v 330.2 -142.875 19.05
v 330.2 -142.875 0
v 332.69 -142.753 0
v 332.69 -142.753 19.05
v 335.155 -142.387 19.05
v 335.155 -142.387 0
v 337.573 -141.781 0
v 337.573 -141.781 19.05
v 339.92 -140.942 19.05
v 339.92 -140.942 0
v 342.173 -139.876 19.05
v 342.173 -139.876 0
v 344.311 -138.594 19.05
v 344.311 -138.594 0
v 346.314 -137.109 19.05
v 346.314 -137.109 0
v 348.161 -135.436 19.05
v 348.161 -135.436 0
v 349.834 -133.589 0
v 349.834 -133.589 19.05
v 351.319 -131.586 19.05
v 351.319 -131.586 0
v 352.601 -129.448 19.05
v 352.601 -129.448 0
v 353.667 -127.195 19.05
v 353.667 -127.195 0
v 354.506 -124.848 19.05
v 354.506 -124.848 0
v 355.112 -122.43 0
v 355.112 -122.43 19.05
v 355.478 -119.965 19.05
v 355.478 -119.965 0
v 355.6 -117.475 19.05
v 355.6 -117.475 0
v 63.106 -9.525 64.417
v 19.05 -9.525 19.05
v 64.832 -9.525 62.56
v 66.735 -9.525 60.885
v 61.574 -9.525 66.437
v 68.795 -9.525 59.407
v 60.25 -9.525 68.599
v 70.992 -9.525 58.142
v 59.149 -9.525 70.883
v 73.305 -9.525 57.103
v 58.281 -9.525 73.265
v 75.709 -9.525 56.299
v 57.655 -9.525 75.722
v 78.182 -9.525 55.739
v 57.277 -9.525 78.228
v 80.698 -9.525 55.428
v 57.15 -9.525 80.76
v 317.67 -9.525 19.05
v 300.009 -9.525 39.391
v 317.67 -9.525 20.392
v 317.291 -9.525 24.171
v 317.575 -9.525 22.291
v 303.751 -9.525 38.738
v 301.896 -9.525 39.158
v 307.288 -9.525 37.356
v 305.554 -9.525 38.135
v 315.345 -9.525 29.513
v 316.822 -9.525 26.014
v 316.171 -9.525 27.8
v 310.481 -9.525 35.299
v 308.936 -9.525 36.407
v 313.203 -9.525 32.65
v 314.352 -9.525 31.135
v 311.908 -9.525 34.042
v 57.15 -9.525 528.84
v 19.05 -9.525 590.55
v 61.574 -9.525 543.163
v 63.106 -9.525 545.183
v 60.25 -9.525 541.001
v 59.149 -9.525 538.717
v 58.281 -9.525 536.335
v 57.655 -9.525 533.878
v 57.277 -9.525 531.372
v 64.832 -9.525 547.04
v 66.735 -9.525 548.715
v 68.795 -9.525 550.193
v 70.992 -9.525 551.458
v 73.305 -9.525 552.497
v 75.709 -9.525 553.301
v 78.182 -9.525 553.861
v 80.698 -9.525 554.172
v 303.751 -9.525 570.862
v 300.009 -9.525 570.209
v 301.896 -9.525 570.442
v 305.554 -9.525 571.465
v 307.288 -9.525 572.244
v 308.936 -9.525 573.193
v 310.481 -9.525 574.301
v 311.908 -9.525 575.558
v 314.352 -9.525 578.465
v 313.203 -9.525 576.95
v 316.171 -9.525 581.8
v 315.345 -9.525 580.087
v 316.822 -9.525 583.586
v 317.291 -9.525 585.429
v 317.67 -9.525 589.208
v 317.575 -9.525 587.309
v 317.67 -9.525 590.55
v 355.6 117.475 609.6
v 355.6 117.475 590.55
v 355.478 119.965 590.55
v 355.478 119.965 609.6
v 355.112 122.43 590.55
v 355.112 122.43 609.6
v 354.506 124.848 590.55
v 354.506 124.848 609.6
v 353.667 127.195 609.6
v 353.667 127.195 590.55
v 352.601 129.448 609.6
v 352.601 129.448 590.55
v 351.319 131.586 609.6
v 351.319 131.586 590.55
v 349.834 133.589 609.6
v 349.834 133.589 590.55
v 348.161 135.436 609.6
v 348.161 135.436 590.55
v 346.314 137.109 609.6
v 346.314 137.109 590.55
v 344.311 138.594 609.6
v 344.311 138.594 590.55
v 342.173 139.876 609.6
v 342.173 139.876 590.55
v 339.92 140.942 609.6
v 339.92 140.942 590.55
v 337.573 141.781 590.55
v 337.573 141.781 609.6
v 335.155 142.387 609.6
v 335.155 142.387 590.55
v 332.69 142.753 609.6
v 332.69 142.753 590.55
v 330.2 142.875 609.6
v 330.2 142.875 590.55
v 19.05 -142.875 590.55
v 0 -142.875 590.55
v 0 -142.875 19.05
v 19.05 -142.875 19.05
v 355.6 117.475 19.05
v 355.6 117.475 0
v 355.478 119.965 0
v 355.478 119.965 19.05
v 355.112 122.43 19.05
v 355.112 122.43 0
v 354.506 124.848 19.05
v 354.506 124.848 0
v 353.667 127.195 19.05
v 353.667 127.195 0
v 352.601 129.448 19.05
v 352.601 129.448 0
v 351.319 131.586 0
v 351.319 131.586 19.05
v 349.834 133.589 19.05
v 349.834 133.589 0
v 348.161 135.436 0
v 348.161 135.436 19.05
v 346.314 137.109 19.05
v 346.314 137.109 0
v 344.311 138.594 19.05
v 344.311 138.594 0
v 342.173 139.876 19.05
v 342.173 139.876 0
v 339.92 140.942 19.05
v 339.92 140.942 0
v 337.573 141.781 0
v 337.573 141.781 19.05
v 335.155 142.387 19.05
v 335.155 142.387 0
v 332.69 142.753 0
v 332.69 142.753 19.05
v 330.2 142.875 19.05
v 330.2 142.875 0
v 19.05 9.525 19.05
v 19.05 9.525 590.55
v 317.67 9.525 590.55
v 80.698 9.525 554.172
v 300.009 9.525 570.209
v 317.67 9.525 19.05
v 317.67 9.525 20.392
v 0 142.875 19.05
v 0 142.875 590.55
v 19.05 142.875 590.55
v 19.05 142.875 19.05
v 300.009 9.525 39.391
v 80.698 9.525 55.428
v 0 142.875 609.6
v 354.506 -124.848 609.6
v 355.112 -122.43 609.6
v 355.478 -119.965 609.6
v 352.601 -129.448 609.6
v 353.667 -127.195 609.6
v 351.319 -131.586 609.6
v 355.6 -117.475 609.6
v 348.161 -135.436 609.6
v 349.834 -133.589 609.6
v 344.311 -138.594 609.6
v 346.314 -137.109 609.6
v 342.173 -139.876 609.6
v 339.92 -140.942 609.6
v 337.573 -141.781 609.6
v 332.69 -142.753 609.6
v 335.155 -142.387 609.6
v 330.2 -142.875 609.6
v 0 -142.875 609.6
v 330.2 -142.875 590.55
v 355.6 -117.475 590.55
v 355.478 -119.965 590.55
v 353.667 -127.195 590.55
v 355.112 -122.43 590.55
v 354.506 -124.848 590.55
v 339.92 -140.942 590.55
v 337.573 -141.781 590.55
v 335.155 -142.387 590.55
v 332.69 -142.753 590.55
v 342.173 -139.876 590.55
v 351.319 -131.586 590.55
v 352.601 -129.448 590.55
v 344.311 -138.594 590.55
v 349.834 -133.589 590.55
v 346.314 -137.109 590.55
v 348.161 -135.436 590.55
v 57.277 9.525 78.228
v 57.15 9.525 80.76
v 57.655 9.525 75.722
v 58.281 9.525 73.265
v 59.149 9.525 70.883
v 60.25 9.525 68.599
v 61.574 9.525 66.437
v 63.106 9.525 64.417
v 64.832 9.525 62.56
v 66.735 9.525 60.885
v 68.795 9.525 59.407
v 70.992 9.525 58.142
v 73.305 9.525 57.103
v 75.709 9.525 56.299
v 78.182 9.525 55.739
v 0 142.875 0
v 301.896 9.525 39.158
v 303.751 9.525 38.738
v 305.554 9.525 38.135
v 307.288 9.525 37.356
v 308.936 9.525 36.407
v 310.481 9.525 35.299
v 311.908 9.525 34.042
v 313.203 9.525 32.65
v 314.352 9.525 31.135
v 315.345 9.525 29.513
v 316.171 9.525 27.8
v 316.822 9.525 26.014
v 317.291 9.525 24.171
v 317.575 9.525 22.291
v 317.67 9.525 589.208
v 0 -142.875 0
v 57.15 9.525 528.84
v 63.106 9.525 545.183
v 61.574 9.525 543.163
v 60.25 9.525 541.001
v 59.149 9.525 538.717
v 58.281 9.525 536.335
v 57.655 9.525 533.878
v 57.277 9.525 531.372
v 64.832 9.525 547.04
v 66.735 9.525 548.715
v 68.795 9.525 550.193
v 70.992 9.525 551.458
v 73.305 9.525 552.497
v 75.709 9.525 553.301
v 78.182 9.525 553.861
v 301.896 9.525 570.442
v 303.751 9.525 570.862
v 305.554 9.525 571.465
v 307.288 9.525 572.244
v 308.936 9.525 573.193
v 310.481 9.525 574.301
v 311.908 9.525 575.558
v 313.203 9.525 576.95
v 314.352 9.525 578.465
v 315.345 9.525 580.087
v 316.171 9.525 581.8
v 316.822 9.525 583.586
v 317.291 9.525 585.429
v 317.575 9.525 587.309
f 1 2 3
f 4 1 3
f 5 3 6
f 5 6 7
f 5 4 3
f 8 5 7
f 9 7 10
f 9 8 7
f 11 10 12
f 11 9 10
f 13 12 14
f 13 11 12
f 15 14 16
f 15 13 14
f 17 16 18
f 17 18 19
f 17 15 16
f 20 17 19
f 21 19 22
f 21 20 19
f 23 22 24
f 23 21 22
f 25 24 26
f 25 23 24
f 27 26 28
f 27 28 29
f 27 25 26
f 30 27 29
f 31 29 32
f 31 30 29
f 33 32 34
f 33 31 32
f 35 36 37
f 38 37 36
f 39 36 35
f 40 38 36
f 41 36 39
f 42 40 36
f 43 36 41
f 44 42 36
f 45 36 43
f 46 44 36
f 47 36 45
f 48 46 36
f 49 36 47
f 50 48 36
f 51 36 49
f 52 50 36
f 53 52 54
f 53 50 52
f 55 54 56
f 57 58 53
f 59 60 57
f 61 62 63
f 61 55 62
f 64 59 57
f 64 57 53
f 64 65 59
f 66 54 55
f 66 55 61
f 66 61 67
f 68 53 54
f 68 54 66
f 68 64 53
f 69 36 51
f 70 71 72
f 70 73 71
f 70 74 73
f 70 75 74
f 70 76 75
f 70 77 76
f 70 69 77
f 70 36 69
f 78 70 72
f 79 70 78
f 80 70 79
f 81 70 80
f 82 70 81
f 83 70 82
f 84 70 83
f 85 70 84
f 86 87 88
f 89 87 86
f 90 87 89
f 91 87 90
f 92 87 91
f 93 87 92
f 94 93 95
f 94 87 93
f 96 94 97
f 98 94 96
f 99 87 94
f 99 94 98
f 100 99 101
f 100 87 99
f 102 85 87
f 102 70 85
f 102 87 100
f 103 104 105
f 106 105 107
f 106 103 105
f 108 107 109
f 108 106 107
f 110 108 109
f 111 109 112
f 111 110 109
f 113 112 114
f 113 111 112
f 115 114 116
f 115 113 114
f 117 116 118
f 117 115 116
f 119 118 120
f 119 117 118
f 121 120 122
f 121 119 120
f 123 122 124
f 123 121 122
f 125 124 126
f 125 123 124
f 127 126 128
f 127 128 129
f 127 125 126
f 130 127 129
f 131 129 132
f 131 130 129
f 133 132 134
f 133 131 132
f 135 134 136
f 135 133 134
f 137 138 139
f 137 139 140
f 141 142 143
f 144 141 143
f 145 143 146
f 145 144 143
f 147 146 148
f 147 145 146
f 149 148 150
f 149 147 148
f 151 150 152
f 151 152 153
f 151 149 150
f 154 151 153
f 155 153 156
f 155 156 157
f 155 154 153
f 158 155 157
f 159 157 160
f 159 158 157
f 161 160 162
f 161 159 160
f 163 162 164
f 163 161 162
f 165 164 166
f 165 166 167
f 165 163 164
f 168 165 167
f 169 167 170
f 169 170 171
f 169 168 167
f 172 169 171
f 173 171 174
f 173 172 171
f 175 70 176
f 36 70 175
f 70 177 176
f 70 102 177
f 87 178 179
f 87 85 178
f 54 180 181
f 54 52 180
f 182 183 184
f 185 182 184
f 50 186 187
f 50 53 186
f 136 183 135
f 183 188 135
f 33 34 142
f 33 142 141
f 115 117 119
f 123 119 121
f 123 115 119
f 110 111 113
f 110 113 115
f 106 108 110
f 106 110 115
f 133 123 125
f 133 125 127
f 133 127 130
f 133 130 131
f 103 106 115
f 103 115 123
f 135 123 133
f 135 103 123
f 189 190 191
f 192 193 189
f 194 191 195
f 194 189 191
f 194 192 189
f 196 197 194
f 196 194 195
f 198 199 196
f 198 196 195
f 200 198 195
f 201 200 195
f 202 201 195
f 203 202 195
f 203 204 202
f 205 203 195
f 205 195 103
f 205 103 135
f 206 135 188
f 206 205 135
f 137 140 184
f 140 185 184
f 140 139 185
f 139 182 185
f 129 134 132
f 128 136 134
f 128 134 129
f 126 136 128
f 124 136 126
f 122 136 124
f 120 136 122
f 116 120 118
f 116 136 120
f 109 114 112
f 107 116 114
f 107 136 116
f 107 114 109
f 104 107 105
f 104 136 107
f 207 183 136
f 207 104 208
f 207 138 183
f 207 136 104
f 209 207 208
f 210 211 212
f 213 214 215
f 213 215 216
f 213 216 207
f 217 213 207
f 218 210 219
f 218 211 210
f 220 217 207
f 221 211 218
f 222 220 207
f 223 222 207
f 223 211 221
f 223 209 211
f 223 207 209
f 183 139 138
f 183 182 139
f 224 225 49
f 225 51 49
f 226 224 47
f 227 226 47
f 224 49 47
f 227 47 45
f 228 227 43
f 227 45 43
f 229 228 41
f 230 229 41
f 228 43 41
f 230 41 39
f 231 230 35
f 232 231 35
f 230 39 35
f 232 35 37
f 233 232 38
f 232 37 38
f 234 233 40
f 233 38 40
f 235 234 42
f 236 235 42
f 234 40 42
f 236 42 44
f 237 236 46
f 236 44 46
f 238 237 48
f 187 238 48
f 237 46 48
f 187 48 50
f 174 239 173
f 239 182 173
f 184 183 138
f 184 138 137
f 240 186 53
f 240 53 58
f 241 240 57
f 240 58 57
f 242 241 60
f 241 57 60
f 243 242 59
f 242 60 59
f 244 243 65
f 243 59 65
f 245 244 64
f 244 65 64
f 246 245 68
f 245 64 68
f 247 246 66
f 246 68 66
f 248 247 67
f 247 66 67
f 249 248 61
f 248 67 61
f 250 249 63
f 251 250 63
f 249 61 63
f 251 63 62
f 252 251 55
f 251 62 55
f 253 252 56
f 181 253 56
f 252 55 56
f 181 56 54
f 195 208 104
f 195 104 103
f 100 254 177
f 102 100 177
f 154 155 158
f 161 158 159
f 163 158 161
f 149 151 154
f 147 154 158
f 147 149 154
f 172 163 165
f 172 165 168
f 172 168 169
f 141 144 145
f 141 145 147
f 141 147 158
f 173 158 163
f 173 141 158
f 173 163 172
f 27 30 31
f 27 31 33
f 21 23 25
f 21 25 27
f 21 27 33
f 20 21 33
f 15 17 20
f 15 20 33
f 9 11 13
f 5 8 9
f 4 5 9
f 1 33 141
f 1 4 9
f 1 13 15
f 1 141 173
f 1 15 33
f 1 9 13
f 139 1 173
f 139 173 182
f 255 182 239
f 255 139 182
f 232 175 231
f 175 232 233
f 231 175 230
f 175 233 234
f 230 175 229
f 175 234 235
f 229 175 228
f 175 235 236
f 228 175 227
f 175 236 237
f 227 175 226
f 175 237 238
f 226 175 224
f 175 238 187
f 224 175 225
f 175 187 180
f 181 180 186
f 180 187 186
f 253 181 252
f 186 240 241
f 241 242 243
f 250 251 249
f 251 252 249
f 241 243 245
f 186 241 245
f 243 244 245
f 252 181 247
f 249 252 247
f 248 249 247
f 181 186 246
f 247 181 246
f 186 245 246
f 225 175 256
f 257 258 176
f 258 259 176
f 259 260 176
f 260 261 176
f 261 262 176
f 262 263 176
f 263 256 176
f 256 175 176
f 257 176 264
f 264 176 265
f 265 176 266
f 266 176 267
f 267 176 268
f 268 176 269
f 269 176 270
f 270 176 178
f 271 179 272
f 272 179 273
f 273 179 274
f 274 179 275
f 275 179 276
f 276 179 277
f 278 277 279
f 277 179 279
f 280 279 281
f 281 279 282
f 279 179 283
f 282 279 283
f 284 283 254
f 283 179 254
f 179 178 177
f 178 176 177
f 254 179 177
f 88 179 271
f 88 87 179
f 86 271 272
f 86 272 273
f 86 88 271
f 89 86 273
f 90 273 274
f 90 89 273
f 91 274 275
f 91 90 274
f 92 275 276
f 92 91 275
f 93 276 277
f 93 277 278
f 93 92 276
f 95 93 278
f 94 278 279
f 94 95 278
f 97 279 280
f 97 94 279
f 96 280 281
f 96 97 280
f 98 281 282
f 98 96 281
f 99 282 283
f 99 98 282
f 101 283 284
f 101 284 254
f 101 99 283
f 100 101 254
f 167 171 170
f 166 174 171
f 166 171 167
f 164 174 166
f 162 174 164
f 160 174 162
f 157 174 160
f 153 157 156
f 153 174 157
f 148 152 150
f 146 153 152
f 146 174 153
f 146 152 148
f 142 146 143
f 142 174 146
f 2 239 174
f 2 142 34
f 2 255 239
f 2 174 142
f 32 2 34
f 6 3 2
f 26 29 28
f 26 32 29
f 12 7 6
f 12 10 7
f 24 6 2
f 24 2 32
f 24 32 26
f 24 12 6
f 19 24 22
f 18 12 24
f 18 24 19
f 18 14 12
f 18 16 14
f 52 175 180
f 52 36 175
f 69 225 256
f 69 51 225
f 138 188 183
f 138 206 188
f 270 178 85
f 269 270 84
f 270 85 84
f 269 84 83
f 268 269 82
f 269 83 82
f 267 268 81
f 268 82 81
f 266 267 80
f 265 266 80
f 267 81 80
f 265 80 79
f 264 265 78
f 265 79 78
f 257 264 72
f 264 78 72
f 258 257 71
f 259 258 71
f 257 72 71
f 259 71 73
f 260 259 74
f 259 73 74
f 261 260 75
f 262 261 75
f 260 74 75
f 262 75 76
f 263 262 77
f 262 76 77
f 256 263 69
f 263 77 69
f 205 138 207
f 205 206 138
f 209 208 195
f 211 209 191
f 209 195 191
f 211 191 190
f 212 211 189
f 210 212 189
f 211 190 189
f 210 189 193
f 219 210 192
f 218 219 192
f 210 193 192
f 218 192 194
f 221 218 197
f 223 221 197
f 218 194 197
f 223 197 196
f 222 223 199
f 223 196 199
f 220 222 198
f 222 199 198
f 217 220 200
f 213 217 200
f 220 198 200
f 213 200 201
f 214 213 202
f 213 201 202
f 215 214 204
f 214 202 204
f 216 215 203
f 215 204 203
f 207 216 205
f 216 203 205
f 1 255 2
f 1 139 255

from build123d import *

# Parameters (mm, degrees)
F1_DEPTH      = 142.875
F0_W          = 19.05
F0_H          = 571.5
F2_DEPTH      = 142.875
F2_DEPTH_BACK = 142.875
F3_DEPTH      = 142.875
F3_DEPTH_BACK = 142.875
F4_DEPTH      = 9.525
F5_R          = 25.4
F6_R          = 19.05
F7_R          = 25.4
F7_2_R        = 25.4


with BuildPart() as f1:
    # F0 (on Front) → F1 (new body, symmetric)
    with BuildSketch(Plane.XZ):
        Polygon((0, 609.6), (0, 590.55), (19.05, 590.55), (317.6700174809, 590.55), (355.6, 590.55), (355.6, 609.6), align=None)
    extrude(amount=F1_DEPTH, both=True)

    # F7
    f7_edges = [f1.edges().sort_by_distance(p)[0] for p in [
        (355.6, -142.875, 600.075),
        (355.6, 142.875, 600.075),
    ]]
    fillet(f7_edges, radius=F7_R)


with BuildPart() as f2:
    # F0 (on Front) → F2 (new body, two sides)
    with BuildSketch(Plane.XZ) as f2_sk:
        with Locations((9.525, 304.8)):
            Rectangle(F0_W, F0_H)
    extrude(amount=-F2_DEPTH)
    extrude(f2_sk.sketch, amount=F2_DEPTH_BACK)


with BuildPart() as f3:
    # F0 (on Front) → F3 (new body, two sides)
    with BuildSketch(Plane.XZ) as f3_sk:
        Polygon((0, 0), (355.6, 0), (355.6, 19.05), (317.6700174809, 19.05), (19.05, 19.05), (0, 19.05), align=None)
    extrude(amount=F3_DEPTH)
    extrude(f3_sk.sketch, amount=-F3_DEPTH_BACK)

    # F7#2
    f7_2_edges = [f3.edges().sort_by_distance(p)[0] for p in [
        (355.6, 142.875, 9.525),
        (355.6, -142.875, 9.525),
    ]]
    fillet(f7_2_edges, radius=F7_2_R)


with BuildPart() as f4:
    # F0 (on Front) → F4 (new body, symmetric)
    with BuildSketch(Plane.XZ):
        Polygon((19.05, 19.05), (317.6700174809, 19.05), (317.6700174809, 38.1), (57.15, 57.15), (57.15, 552.45), (317.6700174809, 571.5), (317.6700174809, 590.55), (19.05, 590.55), align=None)
    extrude(amount=F4_DEPTH, both=True)

    # F5
    f5_edges = [f4.edges().sort_by_distance(p)[0] for p in [
        (57.15, 0, 552.45),
        (57.15, 0, 57.15),
    ]]
    fillet(f5_edges, radius=F5_R)

    # F6
    f6_edges = [f4.edges().sort_by_distance(p)[0] for p in [
        (317.670017, 0, 571.5),
        (317.670017, 0, 38.1),
    ]]
    fillet(f6_edges, radius=F6_R)


solid = Compound([f1.part, f2.part, f3.part, f4.part])
